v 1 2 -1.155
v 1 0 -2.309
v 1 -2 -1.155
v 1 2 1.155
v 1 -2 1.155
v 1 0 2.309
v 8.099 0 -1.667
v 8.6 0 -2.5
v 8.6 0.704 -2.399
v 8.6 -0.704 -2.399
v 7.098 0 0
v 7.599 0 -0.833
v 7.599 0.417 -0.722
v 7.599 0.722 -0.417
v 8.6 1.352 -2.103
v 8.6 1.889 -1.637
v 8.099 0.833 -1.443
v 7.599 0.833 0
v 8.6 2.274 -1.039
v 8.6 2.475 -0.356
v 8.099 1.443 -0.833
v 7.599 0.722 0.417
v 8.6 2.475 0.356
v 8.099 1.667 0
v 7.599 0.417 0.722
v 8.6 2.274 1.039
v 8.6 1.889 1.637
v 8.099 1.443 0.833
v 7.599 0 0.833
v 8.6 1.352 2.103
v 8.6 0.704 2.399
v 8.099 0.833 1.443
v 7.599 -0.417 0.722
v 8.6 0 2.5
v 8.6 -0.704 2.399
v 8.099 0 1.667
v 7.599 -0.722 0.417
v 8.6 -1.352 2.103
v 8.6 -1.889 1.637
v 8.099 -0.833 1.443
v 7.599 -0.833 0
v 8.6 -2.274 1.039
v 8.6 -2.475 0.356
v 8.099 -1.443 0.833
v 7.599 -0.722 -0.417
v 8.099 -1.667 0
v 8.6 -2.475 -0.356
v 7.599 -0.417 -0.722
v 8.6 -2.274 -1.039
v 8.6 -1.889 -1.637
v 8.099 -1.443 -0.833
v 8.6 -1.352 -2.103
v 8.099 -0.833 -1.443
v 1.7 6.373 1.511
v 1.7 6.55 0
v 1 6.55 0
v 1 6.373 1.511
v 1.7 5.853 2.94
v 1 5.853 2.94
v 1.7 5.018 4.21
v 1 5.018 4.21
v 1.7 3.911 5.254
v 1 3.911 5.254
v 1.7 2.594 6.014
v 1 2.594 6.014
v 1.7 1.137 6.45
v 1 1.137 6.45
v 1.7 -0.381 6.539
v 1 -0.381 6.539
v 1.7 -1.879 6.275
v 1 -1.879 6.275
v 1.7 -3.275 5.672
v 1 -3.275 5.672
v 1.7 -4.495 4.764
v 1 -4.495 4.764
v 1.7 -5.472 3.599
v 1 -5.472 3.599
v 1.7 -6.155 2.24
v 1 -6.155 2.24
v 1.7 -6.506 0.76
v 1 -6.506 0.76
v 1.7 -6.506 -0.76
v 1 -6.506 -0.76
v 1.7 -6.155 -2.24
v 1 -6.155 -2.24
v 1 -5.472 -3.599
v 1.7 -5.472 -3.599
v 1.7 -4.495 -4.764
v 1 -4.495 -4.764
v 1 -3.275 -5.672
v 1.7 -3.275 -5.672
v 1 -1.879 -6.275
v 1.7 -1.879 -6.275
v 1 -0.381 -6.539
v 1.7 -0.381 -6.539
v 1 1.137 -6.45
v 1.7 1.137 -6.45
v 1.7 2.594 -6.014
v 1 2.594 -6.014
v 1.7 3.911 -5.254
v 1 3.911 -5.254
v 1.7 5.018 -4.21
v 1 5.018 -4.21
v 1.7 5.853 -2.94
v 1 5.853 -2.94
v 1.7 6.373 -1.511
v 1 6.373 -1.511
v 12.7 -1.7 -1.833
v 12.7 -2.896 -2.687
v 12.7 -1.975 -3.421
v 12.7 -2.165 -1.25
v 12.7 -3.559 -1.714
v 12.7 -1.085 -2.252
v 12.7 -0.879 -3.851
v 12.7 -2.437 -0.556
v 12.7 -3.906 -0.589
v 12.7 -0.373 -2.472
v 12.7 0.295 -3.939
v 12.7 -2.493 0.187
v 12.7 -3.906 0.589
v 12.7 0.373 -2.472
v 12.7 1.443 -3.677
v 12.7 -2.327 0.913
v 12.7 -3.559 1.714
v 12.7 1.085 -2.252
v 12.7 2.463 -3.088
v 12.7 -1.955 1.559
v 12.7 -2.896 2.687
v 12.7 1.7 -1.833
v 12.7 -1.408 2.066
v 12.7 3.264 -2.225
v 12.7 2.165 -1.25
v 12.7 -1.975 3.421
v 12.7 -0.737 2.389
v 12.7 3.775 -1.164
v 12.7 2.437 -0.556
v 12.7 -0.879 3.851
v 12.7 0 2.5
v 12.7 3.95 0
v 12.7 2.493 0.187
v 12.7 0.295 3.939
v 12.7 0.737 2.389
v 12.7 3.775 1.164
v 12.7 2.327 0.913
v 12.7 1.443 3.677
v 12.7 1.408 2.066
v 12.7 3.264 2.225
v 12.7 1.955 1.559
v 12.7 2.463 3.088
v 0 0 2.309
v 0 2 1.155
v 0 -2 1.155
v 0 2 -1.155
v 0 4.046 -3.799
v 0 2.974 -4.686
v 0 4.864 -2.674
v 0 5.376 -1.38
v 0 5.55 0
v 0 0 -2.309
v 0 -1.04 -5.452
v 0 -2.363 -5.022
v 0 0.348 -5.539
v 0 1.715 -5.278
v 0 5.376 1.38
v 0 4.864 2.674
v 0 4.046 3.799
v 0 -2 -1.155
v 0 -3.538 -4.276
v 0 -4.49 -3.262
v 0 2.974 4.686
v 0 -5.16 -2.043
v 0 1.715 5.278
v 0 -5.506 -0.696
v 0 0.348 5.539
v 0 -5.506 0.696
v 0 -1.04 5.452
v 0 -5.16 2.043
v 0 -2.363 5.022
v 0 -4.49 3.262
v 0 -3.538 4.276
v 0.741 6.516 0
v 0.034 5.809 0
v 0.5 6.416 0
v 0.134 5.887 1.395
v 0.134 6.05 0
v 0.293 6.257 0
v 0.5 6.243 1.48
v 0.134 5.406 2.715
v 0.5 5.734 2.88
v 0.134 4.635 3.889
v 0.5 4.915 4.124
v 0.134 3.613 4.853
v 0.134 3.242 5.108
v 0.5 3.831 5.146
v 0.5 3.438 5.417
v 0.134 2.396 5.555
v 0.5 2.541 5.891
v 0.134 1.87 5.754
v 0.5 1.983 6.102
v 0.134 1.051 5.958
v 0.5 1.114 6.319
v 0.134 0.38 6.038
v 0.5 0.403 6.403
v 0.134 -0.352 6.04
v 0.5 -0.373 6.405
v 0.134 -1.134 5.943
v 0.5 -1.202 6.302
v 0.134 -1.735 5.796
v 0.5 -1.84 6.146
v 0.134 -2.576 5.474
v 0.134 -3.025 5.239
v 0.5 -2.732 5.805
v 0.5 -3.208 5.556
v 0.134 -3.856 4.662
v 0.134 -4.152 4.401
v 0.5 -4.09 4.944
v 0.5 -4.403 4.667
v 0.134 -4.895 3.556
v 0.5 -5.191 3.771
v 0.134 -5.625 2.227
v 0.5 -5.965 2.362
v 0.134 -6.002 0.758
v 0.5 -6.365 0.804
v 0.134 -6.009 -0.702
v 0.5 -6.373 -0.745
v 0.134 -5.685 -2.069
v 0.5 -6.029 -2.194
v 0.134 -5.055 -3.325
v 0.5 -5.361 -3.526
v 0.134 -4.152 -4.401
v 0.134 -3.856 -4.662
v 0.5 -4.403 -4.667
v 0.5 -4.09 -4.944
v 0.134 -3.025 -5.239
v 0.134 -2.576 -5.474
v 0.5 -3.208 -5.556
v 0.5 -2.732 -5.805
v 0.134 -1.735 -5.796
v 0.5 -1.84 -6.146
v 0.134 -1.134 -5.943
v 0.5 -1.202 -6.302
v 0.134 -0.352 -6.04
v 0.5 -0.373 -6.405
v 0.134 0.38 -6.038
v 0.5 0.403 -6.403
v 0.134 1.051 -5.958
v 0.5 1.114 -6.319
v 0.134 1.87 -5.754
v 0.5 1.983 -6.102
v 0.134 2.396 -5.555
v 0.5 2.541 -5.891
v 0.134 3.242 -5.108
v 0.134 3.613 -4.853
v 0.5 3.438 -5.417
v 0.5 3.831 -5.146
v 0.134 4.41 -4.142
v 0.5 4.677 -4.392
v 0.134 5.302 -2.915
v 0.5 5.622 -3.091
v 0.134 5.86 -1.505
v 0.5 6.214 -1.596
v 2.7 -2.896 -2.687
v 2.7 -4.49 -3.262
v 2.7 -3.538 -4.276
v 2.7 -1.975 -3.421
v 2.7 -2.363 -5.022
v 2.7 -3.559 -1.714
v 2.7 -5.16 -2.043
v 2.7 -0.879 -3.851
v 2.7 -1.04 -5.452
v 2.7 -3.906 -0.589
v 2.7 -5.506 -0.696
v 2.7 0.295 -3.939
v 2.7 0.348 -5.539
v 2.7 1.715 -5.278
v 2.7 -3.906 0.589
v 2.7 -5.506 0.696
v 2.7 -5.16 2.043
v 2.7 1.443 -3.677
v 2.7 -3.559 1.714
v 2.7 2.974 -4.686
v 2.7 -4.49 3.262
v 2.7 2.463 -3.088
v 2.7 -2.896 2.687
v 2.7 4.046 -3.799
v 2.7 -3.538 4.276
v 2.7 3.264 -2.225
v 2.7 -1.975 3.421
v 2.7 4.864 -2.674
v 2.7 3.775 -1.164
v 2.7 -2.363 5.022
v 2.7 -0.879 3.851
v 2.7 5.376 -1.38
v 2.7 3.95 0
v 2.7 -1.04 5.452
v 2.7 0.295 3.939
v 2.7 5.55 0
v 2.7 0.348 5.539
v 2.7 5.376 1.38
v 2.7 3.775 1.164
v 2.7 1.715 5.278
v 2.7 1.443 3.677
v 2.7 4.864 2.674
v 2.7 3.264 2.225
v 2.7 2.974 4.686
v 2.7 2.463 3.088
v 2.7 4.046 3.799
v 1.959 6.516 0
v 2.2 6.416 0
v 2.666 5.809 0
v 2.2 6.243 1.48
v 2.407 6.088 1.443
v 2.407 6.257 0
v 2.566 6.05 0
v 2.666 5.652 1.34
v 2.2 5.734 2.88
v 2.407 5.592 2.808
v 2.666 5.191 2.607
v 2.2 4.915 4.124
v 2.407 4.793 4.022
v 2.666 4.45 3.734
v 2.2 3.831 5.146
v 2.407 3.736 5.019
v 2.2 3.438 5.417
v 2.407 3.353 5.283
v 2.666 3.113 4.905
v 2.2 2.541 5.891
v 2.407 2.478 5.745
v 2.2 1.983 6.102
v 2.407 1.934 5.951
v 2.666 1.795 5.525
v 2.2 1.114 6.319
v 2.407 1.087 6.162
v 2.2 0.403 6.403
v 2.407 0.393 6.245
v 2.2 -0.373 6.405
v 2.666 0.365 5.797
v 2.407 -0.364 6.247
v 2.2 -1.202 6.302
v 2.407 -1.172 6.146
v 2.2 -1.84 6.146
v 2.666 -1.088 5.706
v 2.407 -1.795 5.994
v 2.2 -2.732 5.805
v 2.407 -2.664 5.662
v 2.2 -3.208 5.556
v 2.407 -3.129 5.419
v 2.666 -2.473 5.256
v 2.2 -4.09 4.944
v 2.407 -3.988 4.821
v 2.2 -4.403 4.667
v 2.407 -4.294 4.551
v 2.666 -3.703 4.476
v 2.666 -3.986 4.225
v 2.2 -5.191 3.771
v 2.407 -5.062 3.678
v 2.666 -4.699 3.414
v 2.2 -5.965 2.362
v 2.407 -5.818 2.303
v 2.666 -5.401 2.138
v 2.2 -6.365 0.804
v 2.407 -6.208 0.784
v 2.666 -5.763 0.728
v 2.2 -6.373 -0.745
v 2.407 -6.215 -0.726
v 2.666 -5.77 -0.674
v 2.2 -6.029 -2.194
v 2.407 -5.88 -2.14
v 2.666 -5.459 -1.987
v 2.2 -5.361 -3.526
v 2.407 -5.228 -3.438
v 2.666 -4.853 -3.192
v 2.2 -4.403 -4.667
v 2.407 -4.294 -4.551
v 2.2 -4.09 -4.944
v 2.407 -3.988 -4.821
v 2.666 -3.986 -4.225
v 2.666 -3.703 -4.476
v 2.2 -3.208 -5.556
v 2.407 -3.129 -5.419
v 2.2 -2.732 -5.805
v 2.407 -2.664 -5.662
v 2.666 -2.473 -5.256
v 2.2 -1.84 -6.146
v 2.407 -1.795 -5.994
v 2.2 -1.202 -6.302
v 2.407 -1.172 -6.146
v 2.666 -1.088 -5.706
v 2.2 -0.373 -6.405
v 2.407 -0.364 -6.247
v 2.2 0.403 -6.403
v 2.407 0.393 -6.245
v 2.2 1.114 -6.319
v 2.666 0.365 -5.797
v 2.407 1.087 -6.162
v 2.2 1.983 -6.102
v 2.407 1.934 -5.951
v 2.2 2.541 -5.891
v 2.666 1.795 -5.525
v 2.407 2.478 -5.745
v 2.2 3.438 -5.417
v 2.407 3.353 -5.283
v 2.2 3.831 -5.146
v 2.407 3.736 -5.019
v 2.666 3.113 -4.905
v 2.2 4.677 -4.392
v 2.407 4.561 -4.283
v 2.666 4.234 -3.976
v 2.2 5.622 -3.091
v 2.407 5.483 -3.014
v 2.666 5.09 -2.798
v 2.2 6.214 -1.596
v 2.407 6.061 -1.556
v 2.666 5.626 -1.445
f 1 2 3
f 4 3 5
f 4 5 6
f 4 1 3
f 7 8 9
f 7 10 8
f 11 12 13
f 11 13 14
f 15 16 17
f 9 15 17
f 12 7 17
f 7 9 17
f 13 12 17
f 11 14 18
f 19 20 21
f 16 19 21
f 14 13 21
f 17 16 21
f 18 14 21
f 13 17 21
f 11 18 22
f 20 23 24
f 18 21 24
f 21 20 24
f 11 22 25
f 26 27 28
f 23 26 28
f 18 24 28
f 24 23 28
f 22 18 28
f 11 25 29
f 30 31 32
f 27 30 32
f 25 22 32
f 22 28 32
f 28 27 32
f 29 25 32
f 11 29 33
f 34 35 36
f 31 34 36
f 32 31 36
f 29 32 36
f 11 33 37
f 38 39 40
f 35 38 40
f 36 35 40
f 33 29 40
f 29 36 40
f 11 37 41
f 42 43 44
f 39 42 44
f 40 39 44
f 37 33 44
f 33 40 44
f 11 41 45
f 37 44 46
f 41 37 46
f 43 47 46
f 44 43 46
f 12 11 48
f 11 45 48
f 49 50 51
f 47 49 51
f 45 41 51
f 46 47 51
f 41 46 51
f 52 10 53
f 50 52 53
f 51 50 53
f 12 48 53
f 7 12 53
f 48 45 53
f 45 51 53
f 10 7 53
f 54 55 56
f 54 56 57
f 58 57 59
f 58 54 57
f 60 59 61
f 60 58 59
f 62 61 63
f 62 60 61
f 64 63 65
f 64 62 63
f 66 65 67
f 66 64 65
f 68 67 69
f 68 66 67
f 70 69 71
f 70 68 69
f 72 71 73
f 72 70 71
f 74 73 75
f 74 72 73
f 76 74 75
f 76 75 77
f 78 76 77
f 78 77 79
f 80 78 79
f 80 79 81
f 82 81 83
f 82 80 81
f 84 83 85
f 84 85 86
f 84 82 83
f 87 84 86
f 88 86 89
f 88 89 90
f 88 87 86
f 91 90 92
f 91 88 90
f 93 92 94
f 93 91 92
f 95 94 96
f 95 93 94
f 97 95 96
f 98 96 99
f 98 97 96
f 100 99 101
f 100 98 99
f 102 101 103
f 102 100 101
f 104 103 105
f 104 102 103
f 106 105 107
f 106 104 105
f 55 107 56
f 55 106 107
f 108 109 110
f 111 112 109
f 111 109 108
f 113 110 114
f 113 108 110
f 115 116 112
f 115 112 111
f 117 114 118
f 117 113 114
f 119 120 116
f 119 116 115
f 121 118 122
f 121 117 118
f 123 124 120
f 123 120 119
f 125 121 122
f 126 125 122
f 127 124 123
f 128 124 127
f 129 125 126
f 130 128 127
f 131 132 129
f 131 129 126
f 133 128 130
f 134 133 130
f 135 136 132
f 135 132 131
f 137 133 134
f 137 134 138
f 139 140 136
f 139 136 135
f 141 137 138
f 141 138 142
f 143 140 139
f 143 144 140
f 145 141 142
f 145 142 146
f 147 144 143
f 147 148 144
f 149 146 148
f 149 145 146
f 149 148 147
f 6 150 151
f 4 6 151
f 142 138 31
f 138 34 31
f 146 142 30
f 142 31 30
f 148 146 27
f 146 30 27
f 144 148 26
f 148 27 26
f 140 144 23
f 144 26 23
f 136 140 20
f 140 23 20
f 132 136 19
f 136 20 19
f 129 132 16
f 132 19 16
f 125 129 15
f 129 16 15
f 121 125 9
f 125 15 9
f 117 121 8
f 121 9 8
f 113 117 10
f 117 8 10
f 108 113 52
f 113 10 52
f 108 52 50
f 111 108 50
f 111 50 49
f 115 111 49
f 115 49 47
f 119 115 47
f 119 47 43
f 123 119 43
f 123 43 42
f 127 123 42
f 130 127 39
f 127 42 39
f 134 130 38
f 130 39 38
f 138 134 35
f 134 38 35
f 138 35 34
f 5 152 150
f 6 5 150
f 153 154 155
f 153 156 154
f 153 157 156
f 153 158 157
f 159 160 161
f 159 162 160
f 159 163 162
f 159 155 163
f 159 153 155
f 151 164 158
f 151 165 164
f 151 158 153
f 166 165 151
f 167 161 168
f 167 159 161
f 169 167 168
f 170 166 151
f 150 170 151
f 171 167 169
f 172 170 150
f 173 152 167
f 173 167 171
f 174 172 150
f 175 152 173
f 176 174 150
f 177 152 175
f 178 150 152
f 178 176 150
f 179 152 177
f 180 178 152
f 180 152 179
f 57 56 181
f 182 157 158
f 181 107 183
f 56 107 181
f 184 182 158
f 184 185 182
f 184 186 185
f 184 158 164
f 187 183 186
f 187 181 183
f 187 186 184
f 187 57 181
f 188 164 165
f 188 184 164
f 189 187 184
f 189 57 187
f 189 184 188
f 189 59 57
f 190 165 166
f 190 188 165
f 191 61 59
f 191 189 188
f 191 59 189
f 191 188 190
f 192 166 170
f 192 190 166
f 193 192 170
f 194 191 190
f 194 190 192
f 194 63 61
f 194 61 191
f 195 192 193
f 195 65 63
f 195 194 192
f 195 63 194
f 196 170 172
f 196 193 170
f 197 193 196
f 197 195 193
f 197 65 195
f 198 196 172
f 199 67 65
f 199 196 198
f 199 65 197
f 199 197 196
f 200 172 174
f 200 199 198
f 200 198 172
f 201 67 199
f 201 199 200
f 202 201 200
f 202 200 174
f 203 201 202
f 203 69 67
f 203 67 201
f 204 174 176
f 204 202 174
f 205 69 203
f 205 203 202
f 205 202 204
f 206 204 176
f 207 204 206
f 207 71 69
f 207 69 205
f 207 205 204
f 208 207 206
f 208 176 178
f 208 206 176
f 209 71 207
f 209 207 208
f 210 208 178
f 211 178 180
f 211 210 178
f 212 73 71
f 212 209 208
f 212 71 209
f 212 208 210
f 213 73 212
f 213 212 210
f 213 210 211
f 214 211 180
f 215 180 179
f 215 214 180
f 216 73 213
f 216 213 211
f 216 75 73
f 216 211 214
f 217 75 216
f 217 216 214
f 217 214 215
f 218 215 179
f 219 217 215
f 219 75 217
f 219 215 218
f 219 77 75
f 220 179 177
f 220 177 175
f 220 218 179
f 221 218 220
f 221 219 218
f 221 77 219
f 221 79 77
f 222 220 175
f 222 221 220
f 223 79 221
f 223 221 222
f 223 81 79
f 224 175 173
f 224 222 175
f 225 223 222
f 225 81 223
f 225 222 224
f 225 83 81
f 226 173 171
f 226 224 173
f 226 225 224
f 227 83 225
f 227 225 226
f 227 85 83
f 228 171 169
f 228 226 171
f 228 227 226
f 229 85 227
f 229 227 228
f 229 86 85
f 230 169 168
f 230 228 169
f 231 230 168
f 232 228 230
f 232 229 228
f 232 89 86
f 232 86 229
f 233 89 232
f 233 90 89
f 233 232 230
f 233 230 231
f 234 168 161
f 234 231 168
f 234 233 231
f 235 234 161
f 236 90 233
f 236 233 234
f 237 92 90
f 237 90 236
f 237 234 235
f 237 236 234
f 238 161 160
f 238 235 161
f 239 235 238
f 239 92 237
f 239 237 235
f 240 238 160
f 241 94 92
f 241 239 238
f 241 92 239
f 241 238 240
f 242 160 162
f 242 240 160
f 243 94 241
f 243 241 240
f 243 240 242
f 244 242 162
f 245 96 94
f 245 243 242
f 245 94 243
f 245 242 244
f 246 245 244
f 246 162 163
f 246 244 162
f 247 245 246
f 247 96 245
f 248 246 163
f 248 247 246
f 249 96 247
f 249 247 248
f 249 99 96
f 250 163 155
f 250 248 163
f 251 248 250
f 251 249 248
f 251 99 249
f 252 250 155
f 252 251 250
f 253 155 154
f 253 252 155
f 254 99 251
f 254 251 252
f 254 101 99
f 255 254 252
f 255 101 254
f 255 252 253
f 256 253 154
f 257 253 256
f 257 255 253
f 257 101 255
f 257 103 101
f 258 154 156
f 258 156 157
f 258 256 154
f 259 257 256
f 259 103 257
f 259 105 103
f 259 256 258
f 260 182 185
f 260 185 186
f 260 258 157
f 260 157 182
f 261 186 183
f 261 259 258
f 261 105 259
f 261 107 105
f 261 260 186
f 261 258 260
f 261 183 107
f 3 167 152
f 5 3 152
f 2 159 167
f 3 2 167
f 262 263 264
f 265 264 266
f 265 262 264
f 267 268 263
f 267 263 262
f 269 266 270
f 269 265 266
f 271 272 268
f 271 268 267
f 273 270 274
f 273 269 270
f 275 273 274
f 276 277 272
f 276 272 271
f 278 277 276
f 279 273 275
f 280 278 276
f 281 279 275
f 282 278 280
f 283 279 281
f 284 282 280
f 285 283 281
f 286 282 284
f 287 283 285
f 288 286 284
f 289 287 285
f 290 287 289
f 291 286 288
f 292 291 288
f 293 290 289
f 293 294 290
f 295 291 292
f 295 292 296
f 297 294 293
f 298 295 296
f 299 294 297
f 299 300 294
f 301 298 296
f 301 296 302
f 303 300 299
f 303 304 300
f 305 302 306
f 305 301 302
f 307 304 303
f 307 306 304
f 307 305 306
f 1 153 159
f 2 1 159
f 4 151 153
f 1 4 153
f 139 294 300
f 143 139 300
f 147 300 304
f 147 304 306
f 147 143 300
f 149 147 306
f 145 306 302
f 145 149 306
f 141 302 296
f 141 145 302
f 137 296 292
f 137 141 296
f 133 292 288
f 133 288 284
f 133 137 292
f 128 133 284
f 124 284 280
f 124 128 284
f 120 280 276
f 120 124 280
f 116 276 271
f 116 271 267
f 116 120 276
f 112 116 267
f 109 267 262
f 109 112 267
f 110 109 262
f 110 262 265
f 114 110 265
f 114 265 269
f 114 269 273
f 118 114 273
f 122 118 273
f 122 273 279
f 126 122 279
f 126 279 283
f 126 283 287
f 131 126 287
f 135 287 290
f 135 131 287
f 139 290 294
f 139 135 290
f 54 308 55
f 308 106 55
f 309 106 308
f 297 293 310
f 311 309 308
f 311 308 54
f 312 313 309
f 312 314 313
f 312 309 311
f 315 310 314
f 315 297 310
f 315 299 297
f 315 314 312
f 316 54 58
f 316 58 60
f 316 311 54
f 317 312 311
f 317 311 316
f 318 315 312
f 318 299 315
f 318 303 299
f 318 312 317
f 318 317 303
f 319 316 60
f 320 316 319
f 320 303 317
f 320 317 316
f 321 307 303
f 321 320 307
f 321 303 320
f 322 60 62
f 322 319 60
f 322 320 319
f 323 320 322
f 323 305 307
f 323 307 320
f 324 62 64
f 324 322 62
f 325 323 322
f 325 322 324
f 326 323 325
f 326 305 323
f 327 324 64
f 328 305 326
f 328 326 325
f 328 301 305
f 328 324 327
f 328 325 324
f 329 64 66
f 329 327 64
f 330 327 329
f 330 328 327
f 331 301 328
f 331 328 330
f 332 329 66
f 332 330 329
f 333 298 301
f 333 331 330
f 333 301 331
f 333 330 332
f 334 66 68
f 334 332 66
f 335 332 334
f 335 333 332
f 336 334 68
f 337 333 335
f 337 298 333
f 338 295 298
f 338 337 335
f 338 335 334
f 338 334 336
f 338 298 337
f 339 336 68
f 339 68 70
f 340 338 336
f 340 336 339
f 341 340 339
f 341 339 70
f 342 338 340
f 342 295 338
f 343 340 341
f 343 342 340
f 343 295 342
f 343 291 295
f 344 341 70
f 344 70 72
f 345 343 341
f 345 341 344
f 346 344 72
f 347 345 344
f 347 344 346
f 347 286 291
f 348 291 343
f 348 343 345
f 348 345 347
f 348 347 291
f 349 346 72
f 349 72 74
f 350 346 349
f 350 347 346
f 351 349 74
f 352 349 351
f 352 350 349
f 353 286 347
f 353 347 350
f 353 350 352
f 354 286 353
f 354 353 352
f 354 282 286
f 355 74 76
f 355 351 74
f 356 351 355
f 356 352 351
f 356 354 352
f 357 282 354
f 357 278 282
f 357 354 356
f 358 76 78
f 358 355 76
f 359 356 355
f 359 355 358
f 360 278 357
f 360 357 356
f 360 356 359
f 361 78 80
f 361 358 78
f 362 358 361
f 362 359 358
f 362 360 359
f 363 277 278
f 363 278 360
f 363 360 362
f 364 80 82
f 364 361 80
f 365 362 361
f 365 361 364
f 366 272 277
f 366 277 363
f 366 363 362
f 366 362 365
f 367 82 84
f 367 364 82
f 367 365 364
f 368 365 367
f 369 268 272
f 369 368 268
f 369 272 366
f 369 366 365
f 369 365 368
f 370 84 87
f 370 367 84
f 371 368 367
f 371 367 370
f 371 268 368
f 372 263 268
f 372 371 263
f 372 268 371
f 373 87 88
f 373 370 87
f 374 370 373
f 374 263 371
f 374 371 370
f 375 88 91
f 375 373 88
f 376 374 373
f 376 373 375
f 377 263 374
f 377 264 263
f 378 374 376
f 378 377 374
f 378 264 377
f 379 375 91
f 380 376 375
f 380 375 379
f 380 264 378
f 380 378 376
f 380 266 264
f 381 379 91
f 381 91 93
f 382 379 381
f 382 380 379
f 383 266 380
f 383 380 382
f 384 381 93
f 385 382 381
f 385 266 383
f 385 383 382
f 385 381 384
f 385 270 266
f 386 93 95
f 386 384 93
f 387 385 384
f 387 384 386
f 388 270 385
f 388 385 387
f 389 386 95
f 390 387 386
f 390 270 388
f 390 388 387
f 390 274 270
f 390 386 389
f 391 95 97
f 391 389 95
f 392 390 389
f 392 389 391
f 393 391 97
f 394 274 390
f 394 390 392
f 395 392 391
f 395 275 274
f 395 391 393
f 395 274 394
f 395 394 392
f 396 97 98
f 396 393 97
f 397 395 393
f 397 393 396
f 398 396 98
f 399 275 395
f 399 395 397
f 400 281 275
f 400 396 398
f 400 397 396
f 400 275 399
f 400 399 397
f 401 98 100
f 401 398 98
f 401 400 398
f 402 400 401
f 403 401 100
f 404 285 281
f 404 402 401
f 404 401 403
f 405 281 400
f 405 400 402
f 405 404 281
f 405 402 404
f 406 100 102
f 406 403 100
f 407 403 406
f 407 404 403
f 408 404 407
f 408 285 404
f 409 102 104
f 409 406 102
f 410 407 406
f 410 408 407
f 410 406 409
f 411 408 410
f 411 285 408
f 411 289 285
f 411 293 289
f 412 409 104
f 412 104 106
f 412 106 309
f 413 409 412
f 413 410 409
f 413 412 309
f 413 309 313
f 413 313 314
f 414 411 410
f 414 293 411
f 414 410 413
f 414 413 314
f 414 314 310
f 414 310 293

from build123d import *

# Parameters (mm, degrees)
FILLET_1_R             = 1
CUT_EXTRUDE_1_DEPTH    = 1
HOLE_WIZARD_M6_1_D     = 5
HOLE_WIZARD_M6_1_DEPTH = 4.1
HOLE_WIZARD_M6_1_TIP   = 1.502151548


with BuildPart() as part:
    # 草图1 → 旋转1 (revolve)
    with BuildSketch(Plane.XY):
        Polygon((0, 0), (0, 6.55), (2.7, 6.55), (2.7, 3.95), (12.7, 3.95), (12.7, 0), align=None)
    revolve(axis=Axis((0, 0, 0), (1, 0, 0)))

    # 圆角1
    fillet_1_edges = [part.edges().sort_by_distance(p)[0] for p in [
        (2.7, -6.55, 0),
        (0, -6.55, 0),
    ]]
    fillet(fillet_1_edges, radius=FILLET_1_R)

    # 草图2 → 切除-拉伸1 (cut)
    with BuildSketch(Plane.ZY):
        Polygon((1.154700538, 2), (-1.154700538, 2), (-2.309401077, 0), (-1.154700538, -2), (1.154700538, -2), (2.309401077, 0), align=None)
    extrude(amount=-CUT_EXTRUDE_1_DEPTH, mode=Mode.SUBTRACT)

    # M6 螺纹孔1
    with Locations(Plane(origin=(12.7, 0, 0), x_dir=(0, 0, -1), z_dir=(1, 0, 0))):
        with Locations((0, 0)):
            Hole(HOLE_WIZARD_M6_1_D / 2, depth=HOLE_WIZARD_M6_1_DEPTH)
            with Locations((0, 0, -(HOLE_WIZARD_M6_1_DEPTH + HOLE_WIZARD_M6_1_TIP / 2))):  # 118° drill point
                Cone(0, HOLE_WIZARD_M6_1_D / 2, HOLE_WIZARD_M6_1_TIP, mode=Mode.SUBTRACT)


solid = part.part
